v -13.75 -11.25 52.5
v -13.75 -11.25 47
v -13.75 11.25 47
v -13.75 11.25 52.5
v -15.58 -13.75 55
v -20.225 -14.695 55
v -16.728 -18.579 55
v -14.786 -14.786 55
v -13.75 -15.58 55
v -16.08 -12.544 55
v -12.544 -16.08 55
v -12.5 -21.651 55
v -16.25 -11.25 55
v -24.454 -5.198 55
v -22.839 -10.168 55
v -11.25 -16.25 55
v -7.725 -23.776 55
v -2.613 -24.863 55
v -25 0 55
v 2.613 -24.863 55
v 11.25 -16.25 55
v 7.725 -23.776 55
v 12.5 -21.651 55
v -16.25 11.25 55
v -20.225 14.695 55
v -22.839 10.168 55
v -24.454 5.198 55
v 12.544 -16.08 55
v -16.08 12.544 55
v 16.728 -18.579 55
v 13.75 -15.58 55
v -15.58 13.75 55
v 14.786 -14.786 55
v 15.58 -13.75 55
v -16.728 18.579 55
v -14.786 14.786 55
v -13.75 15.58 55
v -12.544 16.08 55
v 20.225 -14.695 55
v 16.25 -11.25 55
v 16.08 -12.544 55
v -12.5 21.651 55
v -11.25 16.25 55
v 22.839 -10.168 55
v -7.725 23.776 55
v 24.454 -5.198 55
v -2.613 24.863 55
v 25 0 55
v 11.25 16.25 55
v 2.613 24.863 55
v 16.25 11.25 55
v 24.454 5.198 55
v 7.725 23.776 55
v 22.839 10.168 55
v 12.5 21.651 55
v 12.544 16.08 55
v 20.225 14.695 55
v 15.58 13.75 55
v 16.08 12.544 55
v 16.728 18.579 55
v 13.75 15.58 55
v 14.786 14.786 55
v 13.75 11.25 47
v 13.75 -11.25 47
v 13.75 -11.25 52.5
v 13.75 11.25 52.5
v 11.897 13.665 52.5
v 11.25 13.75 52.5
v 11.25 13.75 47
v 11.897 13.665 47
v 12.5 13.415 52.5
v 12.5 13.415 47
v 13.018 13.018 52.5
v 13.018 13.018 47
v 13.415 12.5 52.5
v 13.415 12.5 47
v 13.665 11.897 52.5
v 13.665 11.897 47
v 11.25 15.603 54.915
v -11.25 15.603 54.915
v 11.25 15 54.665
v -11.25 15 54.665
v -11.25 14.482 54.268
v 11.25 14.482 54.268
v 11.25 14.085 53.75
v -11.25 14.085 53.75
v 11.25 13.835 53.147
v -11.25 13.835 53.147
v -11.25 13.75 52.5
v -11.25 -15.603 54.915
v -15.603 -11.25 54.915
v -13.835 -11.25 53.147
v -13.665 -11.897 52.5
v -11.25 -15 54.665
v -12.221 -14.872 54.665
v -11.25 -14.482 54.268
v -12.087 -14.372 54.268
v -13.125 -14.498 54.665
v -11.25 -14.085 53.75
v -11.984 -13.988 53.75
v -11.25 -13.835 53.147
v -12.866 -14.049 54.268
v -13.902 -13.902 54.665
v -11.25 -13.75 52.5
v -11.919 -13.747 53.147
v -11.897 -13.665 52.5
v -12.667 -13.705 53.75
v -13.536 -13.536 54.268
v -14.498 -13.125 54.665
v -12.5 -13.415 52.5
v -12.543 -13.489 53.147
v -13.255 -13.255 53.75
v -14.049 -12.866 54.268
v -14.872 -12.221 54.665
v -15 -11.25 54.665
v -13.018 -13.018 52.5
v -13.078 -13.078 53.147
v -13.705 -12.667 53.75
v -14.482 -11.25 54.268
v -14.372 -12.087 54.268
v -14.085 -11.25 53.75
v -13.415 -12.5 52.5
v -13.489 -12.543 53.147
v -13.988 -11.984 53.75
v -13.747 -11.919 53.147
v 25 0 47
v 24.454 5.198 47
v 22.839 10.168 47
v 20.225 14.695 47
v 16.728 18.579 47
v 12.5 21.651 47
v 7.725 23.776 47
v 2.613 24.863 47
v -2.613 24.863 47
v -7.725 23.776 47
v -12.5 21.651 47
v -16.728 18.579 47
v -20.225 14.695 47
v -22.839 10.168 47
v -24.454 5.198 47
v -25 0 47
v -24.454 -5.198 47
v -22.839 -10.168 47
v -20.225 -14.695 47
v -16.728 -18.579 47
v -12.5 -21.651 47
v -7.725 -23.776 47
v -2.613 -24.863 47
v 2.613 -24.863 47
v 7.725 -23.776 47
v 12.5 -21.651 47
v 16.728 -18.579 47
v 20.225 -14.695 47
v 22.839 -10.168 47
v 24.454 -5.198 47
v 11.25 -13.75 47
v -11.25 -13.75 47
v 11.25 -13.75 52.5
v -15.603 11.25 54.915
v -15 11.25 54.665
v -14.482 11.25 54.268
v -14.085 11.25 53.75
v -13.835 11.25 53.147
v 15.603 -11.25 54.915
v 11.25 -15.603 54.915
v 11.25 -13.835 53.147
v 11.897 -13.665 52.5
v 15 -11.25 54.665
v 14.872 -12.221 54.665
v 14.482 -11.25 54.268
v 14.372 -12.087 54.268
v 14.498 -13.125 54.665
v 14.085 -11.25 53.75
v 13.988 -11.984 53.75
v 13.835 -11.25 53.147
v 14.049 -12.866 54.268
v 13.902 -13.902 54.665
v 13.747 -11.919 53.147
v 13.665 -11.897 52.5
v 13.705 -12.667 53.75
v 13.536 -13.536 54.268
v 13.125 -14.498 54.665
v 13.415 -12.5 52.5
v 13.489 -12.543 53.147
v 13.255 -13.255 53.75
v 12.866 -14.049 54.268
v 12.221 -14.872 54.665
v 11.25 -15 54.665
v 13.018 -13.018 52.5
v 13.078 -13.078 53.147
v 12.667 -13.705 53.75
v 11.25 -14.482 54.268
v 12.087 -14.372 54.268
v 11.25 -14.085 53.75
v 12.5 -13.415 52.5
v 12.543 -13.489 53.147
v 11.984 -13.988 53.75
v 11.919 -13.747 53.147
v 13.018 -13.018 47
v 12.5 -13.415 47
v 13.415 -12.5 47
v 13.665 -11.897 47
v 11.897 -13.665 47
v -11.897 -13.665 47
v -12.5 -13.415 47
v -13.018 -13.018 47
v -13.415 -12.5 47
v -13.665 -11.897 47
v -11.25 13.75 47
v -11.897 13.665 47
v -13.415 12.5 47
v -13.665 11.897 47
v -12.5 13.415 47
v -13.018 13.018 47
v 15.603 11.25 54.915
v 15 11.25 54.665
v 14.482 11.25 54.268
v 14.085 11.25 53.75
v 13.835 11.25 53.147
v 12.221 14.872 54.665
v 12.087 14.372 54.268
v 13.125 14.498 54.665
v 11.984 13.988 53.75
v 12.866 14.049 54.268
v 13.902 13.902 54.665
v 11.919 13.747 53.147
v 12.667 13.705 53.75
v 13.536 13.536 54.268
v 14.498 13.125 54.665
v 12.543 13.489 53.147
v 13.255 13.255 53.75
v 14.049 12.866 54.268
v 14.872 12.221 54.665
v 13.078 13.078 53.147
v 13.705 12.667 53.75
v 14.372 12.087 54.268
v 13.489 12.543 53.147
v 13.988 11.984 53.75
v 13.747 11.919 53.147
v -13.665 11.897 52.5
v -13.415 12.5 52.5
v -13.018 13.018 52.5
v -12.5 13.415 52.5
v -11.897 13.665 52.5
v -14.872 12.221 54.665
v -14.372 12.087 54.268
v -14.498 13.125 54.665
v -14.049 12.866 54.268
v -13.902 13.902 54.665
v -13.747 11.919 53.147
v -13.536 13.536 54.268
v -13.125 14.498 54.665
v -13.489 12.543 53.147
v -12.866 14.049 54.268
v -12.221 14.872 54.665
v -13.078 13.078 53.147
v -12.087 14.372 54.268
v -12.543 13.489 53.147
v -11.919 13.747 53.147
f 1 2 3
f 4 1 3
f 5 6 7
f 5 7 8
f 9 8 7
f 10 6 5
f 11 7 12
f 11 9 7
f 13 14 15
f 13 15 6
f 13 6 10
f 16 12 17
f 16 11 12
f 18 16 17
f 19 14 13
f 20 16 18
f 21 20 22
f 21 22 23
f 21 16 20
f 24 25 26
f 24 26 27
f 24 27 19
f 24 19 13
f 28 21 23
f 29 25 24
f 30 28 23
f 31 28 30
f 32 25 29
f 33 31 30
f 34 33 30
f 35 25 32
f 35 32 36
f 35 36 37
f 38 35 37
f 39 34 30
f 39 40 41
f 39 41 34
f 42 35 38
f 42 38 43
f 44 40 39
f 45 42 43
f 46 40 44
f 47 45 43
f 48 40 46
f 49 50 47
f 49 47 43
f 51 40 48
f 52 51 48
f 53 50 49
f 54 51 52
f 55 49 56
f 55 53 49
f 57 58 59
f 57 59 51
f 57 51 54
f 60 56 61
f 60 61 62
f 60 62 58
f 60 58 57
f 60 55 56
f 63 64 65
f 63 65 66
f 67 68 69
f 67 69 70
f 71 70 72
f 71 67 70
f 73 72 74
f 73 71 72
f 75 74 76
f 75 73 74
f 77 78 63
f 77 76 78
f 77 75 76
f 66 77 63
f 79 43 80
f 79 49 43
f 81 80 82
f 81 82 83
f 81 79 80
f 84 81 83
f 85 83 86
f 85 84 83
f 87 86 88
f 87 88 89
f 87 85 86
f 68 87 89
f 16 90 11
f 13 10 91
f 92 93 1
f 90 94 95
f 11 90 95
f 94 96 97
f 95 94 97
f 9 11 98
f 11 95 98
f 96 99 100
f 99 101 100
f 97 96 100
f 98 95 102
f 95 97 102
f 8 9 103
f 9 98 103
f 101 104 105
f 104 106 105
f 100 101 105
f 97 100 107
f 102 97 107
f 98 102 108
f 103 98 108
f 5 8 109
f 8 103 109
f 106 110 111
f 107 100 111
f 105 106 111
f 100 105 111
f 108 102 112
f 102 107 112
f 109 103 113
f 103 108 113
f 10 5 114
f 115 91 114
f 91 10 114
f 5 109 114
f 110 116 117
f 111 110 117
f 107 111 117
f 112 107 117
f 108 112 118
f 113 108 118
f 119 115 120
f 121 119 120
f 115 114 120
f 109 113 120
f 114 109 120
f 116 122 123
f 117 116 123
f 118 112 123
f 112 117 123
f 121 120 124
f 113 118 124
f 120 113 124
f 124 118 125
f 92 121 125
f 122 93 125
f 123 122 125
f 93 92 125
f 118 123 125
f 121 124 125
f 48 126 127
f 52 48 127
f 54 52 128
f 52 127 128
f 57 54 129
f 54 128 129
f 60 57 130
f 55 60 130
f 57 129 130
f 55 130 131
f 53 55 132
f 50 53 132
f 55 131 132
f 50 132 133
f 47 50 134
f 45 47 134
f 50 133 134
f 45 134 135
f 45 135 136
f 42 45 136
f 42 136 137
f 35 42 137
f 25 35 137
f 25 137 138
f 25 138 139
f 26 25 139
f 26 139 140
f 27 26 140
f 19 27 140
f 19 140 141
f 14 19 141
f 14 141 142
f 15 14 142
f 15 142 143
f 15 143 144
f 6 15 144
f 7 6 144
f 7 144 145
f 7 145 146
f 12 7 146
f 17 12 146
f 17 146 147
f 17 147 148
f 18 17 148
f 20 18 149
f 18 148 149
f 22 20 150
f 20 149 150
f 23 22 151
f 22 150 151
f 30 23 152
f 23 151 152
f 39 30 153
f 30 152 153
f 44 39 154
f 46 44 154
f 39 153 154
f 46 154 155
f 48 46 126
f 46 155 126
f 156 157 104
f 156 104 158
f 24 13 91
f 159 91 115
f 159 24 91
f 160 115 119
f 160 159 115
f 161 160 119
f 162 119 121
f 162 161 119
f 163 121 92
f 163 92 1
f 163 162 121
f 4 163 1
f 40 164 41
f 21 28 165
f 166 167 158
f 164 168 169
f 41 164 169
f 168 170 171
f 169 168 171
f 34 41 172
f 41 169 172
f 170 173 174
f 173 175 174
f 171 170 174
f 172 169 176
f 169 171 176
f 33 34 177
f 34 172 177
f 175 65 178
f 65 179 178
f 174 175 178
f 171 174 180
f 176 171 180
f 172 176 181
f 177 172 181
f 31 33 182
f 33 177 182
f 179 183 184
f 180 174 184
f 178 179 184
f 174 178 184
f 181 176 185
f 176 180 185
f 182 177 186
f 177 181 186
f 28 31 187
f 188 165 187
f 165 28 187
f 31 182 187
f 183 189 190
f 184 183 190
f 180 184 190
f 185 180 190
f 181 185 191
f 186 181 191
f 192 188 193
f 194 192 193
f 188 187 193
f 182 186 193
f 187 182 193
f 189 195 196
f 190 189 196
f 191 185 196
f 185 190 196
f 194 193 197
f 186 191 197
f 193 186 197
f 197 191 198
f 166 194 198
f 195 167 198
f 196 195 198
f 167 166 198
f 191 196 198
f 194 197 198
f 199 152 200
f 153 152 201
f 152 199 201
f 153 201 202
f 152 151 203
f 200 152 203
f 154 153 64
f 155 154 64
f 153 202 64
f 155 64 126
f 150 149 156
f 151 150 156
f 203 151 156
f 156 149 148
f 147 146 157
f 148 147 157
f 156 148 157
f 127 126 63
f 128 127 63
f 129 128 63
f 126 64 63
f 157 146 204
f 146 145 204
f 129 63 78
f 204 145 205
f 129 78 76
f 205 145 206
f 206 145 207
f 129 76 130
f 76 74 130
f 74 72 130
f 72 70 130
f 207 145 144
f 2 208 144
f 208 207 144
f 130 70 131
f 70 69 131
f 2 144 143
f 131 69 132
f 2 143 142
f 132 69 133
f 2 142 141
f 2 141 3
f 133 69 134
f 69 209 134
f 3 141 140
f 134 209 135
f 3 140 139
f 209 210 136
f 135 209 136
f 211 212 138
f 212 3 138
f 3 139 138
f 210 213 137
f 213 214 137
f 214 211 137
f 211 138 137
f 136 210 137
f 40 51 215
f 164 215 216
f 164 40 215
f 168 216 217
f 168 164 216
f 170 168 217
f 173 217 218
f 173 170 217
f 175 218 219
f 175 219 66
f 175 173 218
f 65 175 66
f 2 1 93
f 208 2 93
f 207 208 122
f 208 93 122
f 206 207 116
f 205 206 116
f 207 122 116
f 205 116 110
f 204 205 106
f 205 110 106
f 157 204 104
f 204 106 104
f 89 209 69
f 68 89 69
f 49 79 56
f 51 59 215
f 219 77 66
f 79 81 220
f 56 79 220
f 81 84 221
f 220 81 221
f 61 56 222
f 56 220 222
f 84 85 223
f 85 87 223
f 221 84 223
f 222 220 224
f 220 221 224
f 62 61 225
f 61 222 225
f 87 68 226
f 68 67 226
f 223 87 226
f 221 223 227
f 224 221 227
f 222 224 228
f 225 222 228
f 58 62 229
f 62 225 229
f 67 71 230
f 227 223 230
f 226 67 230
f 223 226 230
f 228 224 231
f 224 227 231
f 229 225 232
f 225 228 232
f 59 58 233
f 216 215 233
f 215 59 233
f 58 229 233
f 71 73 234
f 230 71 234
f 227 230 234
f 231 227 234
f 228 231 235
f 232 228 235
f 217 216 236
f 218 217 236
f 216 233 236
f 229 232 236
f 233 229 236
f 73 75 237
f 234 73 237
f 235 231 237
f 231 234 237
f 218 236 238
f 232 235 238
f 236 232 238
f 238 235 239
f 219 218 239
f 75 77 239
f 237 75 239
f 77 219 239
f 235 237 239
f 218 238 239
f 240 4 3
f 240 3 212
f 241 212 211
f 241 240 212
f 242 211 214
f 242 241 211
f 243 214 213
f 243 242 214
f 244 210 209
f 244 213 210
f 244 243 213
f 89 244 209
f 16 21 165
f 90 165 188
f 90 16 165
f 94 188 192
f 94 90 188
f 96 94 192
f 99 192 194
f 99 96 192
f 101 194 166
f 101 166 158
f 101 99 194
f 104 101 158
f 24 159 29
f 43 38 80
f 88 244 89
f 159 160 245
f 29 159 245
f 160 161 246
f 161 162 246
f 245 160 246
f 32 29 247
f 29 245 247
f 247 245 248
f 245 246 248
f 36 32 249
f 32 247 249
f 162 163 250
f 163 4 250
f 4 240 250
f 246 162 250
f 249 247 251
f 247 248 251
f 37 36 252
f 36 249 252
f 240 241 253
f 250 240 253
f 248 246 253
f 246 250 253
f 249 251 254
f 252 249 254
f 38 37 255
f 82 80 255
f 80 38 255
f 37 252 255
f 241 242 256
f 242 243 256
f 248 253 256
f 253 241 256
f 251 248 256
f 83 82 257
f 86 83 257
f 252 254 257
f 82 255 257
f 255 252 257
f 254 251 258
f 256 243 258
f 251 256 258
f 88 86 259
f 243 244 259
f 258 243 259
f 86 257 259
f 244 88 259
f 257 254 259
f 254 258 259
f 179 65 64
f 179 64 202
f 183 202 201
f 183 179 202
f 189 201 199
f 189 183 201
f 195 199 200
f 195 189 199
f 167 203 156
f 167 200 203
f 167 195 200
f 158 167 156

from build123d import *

# Parameters (mm, degrees)
SKETCH1_R               = 25
SKETCH1_W               = 27.5
SKETCH1_H               = 27.5
BOSS_EXTRUDE1_DEPTH     = 55
BOSS_EXTRUDE2_START     = 5
SKETCH2_R               = 25
BOSS_EXTRUDE2_DEPTH     = 5
SKETCH3_W               = 25
SKETCH3_H               = 50
BOSS_EXTRUDE3_DEPTH     = 80
FILLET1_R               = 2.5
FILLET2_R               = 2.5
SKETCH21_W              = 54.3
SKETCH21_H              = 20.3
CUT_EXTRUDE1_DEPTH      = 11.3
SKETCH22_W              = 40.3
SKETCH22_H              = 20.3
CUT_EXTRUDE2_DEPTH      = 93.059763198
CUT_EXTRUDE3_DEPTH      = 88.464278423
SKETCH23_R              = 2.15
CUT_EXTRUDE4_DEPTH      = 93.059763198
CUT_EXTRUDE7_DEPTH      = 27.5
CUT_EXTRUDE8_DEPTH      = 93.059763198
CUT_EXTRUDE8_DEPTH_BACK = 93.059763198
SKETCH25_W              = 132
SKETCH25_H              = 50


with BuildPart() as part:
    # Sketch1 → Boss-Extrude1 (new body)
    with BuildSketch(Plane.XY):
        Circle(SKETCH1_R)
        Rectangle(SKETCH1_W, SKETCH1_H, mode=Mode.SUBTRACT)
    extrude(amount=BOSS_EXTRUDE1_DEPTH)

    # Sketch2 → Boss-Extrude2 (add)
    with BuildSketch(Plane(origin=(0, 0, 0), x_dir=(-1, 0, 0), z_dir=(0, 0, -1)).offset(BOSS_EXTRUDE2_START)):
        Circle(SKETCH2_R)
    extrude(amount=-BOSS_EXTRUDE2_DEPTH)

    # Sketch3 → Boss-Extrude3 (add)
    with BuildSketch(Plane(origin=(0, 0, -5), x_dir=(-1, 0, 0), z_dir=(0, 0, -1))):
        with Locations((12.5, 0)):
            Rectangle(SKETCH3_W, SKETCH3_H)
    extrude(amount=BOSS_EXTRUDE3_DEPTH)

    # Fillet1
    fillet1_edges = [part.edges().sort_by_distance(p)[0] for p in [
        (-13.75, 13.75, 27.5),
        (13.75, 13.75, 27.5),
        (-13.75, -13.75, 27.5),
        (13.75, -13.75, 27.5),
    ]]
    fillet(fillet1_edges, radius=FILLET1_R)

    # Fillet2
    fillet2_edges = [part.edges().sort_by_distance(p)[0] for p in [
        (13.75, 0, 55),
    ]]
    fillet(fillet2_edges, radius=FILLET2_R)

    # Sketch21 → Cut-Extrude1 (cut)
    with BuildSketch(Plane(origin=(0, 0, 0), x_dir=(0, 0, -1), z_dir=(1, 0, 0))):
        with Locations((51.85, 0)):
            Rectangle(SKETCH21_W, SKETCH21_H)
    extrude(amount=-CUT_EXTRUDE1_DEPTH, mode=Mode.SUBTRACT)

    # Sketch22 → Cut-Extrude2 (cut, through all)
    with BuildSketch(Plane(origin=(0, 0, 0), x_dir=(0, 0, -1), z_dir=(1, 0, 0))):
        with Locations((51.7, 0)):
            Rectangle(SKETCH22_W, SKETCH22_H)
    extrude(amount=-CUT_EXTRUDE2_DEPTH, mode=Mode.SUBTRACT)

    # Sketch18 → Cut-Extrude3 (cut, through all)
    with BuildSketch(Plane.XY.offset(-5)):
        with BuildLine():
            Line((-25, -25), (0, -25))
            ThreePointArc((0, -25), (-17.67766953, -17.67766953), (-25, 0))
            Line((-25, 0), (-25, -25))
        make_face()
        with BuildLine():
            Line((-25, 25), (-25, 0))
            ThreePointArc((-25, 0), (-17.67766953, 17.67766953), (0, 25))
            Line((0, 25), (-25, 25))
        make_face()
    extrude(amount=-CUT_EXTRUDE3_DEPTH, mode=Mode.SUBTRACT)

    # Sketch23 → Cut-Extrude4 (cut, through all)
    with BuildSketch(Plane(origin=(0, 0, 0), x_dir=(0, 0, -1), z_dir=(1, 0, 0))):
        with Locations((75.85, 5.25)):
            Circle(SKETCH23_R)
        with Locations((75.85, -5.25)):
            Circle(SKETCH23_R)
        with Locations((27.85, 5.25)):
            Circle(SKETCH23_R)
        with Locations((27.85, -5.25)):
            Circle(SKETCH23_R)
    extrude(amount=-CUT_EXTRUDE4_DEPTH, mode=Mode.SUBTRACT)

    # Sketch24 → Cut-Extrude7 (cut, symmetric)
    with BuildSketch(Plane(origin=(0, 0, -51.7), x_dir=(-1, 0, 0), z_dir=(0, 0, -1))):
        with BuildLine():
            Line((13.3, 10.15), (13.3, -10.15))
            Line((13.3, -10.15), (22.846826913, -10.15))
            ThreePointArc((22.846826913, -10.15), (25, 0), (22.846826913, 10.15))
            Line((22.846826913, 10.15), (13.3, 10.15))
        make_face()
    extrude(amount=CUT_EXTRUDE7_DEPTH, both=True, mode=Mode.SUBTRACT)

    # Sketch25 → Cut-Extrude8 (cut, two sides: drawn at the far end of the back side and taken through both)
    with BuildSketch(Plane(origin=(0, 0, 0), x_dir=(0, 0, -1), z_dir=(1, 0, 0)).offset(-CUT_EXTRUDE8_DEPTH_BACK)):
        with Locations((19, 0)):
            Rectangle(SKETCH25_W, SKETCH25_H)
    extrude(amount=CUT_EXTRUDE8_DEPTH + CUT_EXTRUDE8_DEPTH_BACK, mode=Mode.SUBTRACT)


solid = part.part
